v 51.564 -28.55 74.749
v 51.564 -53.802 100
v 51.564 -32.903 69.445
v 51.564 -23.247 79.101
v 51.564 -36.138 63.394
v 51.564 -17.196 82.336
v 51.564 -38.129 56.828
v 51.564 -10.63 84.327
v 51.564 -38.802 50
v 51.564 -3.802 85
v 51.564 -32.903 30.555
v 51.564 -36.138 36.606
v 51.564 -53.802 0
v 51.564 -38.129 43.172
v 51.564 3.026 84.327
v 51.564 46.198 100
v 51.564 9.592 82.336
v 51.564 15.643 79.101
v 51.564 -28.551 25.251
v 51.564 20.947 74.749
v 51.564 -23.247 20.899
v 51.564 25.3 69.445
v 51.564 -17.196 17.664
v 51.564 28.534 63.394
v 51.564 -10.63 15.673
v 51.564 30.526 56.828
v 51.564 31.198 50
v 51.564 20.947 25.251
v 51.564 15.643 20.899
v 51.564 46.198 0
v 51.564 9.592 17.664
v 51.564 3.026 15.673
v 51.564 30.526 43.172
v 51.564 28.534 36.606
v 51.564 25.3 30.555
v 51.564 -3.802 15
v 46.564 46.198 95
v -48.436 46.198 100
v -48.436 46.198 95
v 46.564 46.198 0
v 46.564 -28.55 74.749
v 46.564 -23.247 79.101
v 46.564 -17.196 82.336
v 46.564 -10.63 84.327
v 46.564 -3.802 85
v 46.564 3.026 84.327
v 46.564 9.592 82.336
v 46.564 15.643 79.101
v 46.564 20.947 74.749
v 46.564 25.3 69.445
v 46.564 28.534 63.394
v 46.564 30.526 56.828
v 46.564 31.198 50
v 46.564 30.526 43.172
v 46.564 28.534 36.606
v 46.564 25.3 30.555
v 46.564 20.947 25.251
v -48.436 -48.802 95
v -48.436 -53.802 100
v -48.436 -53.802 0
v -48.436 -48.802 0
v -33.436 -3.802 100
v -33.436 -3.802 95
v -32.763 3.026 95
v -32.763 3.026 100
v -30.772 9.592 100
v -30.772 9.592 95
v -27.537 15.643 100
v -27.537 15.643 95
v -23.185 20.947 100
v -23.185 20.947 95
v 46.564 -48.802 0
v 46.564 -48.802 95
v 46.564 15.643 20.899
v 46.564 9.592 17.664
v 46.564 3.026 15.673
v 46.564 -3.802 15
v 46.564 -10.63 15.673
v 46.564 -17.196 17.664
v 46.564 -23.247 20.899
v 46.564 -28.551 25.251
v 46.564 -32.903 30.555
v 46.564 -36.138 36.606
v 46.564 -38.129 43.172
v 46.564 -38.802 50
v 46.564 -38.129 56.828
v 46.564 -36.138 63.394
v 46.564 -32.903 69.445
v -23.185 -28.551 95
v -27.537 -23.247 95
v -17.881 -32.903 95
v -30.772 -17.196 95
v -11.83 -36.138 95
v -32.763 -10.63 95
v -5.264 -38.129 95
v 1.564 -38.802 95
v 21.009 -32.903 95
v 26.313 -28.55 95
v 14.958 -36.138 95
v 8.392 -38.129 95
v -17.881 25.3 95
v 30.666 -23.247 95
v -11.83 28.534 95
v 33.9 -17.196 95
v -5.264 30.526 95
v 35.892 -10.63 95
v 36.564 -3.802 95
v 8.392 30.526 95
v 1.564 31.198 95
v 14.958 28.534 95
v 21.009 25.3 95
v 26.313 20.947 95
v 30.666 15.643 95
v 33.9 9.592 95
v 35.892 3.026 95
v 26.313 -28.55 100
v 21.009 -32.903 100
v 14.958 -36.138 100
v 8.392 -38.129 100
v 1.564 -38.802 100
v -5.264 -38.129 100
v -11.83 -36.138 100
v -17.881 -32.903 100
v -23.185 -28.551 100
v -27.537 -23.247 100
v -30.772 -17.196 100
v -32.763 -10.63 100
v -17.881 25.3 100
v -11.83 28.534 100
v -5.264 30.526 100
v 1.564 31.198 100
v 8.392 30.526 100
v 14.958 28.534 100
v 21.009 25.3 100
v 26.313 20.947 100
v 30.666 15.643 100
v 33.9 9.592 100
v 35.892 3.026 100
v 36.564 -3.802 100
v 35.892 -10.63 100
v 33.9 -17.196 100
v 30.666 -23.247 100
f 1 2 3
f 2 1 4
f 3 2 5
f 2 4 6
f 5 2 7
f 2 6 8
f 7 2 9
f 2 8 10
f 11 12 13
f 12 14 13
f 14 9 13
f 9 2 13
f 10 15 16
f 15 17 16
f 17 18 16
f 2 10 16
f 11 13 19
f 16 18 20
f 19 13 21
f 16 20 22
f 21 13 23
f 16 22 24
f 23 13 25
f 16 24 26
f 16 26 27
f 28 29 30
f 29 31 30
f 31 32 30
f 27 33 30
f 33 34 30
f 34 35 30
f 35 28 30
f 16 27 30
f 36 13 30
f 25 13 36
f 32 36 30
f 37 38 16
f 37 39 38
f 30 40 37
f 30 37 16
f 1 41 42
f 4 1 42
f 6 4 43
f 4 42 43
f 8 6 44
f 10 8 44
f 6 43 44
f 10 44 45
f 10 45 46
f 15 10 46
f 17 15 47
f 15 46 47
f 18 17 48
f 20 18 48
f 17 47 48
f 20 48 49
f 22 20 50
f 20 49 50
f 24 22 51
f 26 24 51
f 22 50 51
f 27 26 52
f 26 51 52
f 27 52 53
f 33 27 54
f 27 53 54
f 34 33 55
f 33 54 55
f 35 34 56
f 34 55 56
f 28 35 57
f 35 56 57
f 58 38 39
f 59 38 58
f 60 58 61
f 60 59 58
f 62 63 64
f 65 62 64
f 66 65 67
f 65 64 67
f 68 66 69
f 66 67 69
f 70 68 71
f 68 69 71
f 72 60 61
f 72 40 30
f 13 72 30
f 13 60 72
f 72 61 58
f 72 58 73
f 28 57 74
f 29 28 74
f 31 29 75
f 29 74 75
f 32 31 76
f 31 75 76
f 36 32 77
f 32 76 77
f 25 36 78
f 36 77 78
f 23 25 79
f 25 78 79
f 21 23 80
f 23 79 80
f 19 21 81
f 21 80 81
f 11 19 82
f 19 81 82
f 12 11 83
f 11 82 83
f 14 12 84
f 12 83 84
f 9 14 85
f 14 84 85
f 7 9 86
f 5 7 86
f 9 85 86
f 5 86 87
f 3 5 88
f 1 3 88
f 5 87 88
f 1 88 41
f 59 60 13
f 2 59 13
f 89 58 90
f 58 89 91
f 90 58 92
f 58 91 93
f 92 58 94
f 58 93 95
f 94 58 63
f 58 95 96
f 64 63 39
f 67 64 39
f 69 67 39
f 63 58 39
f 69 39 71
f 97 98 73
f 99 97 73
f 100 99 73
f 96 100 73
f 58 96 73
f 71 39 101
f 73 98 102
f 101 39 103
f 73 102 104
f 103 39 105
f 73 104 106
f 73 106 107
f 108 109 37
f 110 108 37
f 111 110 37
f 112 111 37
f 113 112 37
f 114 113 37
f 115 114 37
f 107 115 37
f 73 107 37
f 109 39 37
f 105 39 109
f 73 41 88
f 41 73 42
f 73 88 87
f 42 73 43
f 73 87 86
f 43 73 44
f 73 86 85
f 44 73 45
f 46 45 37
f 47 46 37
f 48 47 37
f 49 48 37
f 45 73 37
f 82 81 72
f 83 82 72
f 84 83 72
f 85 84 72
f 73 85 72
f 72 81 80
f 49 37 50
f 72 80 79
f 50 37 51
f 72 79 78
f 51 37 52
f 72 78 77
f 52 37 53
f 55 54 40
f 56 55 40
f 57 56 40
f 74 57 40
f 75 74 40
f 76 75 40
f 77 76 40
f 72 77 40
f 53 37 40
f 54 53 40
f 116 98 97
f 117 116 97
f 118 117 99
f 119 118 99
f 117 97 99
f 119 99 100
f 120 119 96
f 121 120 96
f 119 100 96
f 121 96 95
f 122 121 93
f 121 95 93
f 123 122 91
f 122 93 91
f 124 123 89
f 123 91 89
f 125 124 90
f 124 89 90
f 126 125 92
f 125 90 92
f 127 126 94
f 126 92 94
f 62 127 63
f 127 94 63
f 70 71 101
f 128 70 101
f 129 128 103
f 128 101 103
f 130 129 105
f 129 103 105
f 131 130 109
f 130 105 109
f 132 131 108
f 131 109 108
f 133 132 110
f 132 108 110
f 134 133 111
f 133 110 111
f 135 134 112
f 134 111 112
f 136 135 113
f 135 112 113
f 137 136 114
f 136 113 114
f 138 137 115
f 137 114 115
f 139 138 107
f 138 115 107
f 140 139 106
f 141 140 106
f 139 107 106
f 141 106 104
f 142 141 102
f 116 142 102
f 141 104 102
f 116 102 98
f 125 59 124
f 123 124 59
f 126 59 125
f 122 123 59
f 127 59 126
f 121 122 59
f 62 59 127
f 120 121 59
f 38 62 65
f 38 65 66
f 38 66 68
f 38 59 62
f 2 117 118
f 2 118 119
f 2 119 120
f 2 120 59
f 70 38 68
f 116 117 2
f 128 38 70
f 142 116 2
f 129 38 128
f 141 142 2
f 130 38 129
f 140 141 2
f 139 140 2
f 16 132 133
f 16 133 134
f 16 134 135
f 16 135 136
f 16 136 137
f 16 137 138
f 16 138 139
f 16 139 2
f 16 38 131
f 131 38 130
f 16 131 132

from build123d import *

# Parameters (mm, degrees)
ESQUISSE4_W             = 100
ESQUISSE4_H             = 100
ESQUISSE4_W_2           = 90
ESQUISSE4_H_2           = 90
BOSS_EXTRU_1_DEPTH      = 100
ESQUISSE5_W             = 100
ESQUISSE5_H             = 100
BOSS_EXTRU_2_DEPTH      = 10
ESQUISSE6_W             = 95
ESQUISSE6_H             = 94.999780415
ENL_V_MAT_EXTRU_1_DEPTH = 95
ESQUISSE7_W             = 95
ESQUISSE7_H             = 95
ENL_V_MAT_EXTRU_2_DEPTH = 1
ESQUISSE8_W             = 95
ESQUISSE8_H             = 95
BOSS_EXTRU_3_DEPTH      = 1
ENL_V_MAT_EXTRU_4_DEPTH = 55.5
ENL_V_MAT_EXTRU_5_DEPTH = 21.5


with BuildPart() as part:
    # Esquisse4 → Boss.-Extru.1 (new body)
    with BuildSketch(Plane.XY):
        with Locations((1.564199822, -3.801871506)):
            Rectangle(ESQUISSE4_W, ESQUISSE4_H)
        with Locations((1.564199822, -3.801871506)):
            Rectangle(ESQUISSE4_W_2, ESQUISSE4_H_2, mode=Mode.SUBTRACT)
    extrude(amount=BOSS_EXTRU_1_DEPTH)

    # Esquisse5 → Boss.-Extru.2 (add)
    with BuildSketch(Plane.XY.offset(100)):
        with Locations((1.564199822, -3.801871506)):
            Rectangle(ESQUISSE5_W, ESQUISSE5_H)
    extrude(amount=-BOSS_EXTRU_2_DEPTH)

    # Esquisse6 → Enlèv. mat.-Extru.1 (cut)
    with BuildSketch(Plane(origin=(0, 0, 0), x_dir=(-1, 0, 0), z_dir=(0, 0, -1))):
        with Locations((0.935800178, -1.301761713)):
            Rectangle(ESQUISSE6_W, ESQUISSE6_H)
    extrude(amount=-ENL_V_MAT_EXTRU_1_DEPTH, mode=Mode.SUBTRACT)

    # Esquisse7 → Enlèv. mat.-Extru.2 (cut)
    with BuildSketch(Plane(origin=(0, -48.801651921, 0), x_dir=(1, 0, 0), z_dir=(0, 1, 0))):
        with Locations((-0.935800178, -47.5)):
            Rectangle(ESQUISSE7_W, ESQUISSE7_H)
    extrude(amount=-ENL_V_MAT_EXTRU_2_DEPTH, mode=Mode.SUBTRACT)

    # Esquisse8 → Boss.-Extru.3 (add)
    with BuildSketch(Plane(origin=(0, -49.801651921, 0), x_dir=(1, 0, 0), z_dir=(0, 1, 0))):
        with Locations((-0.935800178, -47.5)):
            Rectangle(ESQUISSE8_W, ESQUISSE8_H)
    extrude(amount=BOSS_EXTRU_3_DEPTH)

    # Esquisse9 → Enlèv. mat.-Extru.4 (cut)
    with BuildSketch(Plane(origin=(0, 0, 95), x_dir=(-1, 0, 0), z_dir=(0, 0, -1))):
        with BuildLine():
            ThreePointArc((23.184567711, 20.946945437), (-26.312906972, 20.94700582), (-26.312967355, -28.550468863))
            Line((-26.312967355, -28.550468863), (23.184567711, 20.946945437))
        make_face()
        with BuildLine():
            Line((23.184567711, 20.946945437), (-26.312967355, -28.550468863))
            ThreePointArc((-26.312967355, -28.550468863), (11.829700587, -36.137553521), (33.435800178, -3.801761713))
            ThreePointArc((33.435800178, -3.801761713), (30.771591985, 9.592138696), (23.184567711, 20.946945437))
        make_face()
    extrude(amount=-ENL_V_MAT_EXTRU_4_DEPTH, mode=Mode.SUBTRACT)

    # Esquisse11 → Enlèv. mat.-Extru.5 (cut)
    with BuildSketch(Plane.ZY.offset(-46.564199822)):
        with BuildLine():
            ThreePointArc((25.251232467, 20.946945437), (25.25129285, -28.550529246), (74.748767533, -28.550468863))
            Line((74.748767533, -28.550468863), (25.251232467, 20.946945437))
        make_face()
        with BuildLine():
            Line((25.251232467, 20.946945437), (74.748767533, -28.550468863))
            ThreePointArc((74.748767533, -28.550468863), (82.335791808, -17.195662123), (85, -3.801761713))
            ThreePointArc((85, -3.801761713), (63.393900409, 28.534030094), (25.251232467, 20.946945437))
        make_face()
    extrude(amount=-ENL_V_MAT_EXTRU_5_DEPTH, mode=Mode.SUBTRACT)


solid = part.part
